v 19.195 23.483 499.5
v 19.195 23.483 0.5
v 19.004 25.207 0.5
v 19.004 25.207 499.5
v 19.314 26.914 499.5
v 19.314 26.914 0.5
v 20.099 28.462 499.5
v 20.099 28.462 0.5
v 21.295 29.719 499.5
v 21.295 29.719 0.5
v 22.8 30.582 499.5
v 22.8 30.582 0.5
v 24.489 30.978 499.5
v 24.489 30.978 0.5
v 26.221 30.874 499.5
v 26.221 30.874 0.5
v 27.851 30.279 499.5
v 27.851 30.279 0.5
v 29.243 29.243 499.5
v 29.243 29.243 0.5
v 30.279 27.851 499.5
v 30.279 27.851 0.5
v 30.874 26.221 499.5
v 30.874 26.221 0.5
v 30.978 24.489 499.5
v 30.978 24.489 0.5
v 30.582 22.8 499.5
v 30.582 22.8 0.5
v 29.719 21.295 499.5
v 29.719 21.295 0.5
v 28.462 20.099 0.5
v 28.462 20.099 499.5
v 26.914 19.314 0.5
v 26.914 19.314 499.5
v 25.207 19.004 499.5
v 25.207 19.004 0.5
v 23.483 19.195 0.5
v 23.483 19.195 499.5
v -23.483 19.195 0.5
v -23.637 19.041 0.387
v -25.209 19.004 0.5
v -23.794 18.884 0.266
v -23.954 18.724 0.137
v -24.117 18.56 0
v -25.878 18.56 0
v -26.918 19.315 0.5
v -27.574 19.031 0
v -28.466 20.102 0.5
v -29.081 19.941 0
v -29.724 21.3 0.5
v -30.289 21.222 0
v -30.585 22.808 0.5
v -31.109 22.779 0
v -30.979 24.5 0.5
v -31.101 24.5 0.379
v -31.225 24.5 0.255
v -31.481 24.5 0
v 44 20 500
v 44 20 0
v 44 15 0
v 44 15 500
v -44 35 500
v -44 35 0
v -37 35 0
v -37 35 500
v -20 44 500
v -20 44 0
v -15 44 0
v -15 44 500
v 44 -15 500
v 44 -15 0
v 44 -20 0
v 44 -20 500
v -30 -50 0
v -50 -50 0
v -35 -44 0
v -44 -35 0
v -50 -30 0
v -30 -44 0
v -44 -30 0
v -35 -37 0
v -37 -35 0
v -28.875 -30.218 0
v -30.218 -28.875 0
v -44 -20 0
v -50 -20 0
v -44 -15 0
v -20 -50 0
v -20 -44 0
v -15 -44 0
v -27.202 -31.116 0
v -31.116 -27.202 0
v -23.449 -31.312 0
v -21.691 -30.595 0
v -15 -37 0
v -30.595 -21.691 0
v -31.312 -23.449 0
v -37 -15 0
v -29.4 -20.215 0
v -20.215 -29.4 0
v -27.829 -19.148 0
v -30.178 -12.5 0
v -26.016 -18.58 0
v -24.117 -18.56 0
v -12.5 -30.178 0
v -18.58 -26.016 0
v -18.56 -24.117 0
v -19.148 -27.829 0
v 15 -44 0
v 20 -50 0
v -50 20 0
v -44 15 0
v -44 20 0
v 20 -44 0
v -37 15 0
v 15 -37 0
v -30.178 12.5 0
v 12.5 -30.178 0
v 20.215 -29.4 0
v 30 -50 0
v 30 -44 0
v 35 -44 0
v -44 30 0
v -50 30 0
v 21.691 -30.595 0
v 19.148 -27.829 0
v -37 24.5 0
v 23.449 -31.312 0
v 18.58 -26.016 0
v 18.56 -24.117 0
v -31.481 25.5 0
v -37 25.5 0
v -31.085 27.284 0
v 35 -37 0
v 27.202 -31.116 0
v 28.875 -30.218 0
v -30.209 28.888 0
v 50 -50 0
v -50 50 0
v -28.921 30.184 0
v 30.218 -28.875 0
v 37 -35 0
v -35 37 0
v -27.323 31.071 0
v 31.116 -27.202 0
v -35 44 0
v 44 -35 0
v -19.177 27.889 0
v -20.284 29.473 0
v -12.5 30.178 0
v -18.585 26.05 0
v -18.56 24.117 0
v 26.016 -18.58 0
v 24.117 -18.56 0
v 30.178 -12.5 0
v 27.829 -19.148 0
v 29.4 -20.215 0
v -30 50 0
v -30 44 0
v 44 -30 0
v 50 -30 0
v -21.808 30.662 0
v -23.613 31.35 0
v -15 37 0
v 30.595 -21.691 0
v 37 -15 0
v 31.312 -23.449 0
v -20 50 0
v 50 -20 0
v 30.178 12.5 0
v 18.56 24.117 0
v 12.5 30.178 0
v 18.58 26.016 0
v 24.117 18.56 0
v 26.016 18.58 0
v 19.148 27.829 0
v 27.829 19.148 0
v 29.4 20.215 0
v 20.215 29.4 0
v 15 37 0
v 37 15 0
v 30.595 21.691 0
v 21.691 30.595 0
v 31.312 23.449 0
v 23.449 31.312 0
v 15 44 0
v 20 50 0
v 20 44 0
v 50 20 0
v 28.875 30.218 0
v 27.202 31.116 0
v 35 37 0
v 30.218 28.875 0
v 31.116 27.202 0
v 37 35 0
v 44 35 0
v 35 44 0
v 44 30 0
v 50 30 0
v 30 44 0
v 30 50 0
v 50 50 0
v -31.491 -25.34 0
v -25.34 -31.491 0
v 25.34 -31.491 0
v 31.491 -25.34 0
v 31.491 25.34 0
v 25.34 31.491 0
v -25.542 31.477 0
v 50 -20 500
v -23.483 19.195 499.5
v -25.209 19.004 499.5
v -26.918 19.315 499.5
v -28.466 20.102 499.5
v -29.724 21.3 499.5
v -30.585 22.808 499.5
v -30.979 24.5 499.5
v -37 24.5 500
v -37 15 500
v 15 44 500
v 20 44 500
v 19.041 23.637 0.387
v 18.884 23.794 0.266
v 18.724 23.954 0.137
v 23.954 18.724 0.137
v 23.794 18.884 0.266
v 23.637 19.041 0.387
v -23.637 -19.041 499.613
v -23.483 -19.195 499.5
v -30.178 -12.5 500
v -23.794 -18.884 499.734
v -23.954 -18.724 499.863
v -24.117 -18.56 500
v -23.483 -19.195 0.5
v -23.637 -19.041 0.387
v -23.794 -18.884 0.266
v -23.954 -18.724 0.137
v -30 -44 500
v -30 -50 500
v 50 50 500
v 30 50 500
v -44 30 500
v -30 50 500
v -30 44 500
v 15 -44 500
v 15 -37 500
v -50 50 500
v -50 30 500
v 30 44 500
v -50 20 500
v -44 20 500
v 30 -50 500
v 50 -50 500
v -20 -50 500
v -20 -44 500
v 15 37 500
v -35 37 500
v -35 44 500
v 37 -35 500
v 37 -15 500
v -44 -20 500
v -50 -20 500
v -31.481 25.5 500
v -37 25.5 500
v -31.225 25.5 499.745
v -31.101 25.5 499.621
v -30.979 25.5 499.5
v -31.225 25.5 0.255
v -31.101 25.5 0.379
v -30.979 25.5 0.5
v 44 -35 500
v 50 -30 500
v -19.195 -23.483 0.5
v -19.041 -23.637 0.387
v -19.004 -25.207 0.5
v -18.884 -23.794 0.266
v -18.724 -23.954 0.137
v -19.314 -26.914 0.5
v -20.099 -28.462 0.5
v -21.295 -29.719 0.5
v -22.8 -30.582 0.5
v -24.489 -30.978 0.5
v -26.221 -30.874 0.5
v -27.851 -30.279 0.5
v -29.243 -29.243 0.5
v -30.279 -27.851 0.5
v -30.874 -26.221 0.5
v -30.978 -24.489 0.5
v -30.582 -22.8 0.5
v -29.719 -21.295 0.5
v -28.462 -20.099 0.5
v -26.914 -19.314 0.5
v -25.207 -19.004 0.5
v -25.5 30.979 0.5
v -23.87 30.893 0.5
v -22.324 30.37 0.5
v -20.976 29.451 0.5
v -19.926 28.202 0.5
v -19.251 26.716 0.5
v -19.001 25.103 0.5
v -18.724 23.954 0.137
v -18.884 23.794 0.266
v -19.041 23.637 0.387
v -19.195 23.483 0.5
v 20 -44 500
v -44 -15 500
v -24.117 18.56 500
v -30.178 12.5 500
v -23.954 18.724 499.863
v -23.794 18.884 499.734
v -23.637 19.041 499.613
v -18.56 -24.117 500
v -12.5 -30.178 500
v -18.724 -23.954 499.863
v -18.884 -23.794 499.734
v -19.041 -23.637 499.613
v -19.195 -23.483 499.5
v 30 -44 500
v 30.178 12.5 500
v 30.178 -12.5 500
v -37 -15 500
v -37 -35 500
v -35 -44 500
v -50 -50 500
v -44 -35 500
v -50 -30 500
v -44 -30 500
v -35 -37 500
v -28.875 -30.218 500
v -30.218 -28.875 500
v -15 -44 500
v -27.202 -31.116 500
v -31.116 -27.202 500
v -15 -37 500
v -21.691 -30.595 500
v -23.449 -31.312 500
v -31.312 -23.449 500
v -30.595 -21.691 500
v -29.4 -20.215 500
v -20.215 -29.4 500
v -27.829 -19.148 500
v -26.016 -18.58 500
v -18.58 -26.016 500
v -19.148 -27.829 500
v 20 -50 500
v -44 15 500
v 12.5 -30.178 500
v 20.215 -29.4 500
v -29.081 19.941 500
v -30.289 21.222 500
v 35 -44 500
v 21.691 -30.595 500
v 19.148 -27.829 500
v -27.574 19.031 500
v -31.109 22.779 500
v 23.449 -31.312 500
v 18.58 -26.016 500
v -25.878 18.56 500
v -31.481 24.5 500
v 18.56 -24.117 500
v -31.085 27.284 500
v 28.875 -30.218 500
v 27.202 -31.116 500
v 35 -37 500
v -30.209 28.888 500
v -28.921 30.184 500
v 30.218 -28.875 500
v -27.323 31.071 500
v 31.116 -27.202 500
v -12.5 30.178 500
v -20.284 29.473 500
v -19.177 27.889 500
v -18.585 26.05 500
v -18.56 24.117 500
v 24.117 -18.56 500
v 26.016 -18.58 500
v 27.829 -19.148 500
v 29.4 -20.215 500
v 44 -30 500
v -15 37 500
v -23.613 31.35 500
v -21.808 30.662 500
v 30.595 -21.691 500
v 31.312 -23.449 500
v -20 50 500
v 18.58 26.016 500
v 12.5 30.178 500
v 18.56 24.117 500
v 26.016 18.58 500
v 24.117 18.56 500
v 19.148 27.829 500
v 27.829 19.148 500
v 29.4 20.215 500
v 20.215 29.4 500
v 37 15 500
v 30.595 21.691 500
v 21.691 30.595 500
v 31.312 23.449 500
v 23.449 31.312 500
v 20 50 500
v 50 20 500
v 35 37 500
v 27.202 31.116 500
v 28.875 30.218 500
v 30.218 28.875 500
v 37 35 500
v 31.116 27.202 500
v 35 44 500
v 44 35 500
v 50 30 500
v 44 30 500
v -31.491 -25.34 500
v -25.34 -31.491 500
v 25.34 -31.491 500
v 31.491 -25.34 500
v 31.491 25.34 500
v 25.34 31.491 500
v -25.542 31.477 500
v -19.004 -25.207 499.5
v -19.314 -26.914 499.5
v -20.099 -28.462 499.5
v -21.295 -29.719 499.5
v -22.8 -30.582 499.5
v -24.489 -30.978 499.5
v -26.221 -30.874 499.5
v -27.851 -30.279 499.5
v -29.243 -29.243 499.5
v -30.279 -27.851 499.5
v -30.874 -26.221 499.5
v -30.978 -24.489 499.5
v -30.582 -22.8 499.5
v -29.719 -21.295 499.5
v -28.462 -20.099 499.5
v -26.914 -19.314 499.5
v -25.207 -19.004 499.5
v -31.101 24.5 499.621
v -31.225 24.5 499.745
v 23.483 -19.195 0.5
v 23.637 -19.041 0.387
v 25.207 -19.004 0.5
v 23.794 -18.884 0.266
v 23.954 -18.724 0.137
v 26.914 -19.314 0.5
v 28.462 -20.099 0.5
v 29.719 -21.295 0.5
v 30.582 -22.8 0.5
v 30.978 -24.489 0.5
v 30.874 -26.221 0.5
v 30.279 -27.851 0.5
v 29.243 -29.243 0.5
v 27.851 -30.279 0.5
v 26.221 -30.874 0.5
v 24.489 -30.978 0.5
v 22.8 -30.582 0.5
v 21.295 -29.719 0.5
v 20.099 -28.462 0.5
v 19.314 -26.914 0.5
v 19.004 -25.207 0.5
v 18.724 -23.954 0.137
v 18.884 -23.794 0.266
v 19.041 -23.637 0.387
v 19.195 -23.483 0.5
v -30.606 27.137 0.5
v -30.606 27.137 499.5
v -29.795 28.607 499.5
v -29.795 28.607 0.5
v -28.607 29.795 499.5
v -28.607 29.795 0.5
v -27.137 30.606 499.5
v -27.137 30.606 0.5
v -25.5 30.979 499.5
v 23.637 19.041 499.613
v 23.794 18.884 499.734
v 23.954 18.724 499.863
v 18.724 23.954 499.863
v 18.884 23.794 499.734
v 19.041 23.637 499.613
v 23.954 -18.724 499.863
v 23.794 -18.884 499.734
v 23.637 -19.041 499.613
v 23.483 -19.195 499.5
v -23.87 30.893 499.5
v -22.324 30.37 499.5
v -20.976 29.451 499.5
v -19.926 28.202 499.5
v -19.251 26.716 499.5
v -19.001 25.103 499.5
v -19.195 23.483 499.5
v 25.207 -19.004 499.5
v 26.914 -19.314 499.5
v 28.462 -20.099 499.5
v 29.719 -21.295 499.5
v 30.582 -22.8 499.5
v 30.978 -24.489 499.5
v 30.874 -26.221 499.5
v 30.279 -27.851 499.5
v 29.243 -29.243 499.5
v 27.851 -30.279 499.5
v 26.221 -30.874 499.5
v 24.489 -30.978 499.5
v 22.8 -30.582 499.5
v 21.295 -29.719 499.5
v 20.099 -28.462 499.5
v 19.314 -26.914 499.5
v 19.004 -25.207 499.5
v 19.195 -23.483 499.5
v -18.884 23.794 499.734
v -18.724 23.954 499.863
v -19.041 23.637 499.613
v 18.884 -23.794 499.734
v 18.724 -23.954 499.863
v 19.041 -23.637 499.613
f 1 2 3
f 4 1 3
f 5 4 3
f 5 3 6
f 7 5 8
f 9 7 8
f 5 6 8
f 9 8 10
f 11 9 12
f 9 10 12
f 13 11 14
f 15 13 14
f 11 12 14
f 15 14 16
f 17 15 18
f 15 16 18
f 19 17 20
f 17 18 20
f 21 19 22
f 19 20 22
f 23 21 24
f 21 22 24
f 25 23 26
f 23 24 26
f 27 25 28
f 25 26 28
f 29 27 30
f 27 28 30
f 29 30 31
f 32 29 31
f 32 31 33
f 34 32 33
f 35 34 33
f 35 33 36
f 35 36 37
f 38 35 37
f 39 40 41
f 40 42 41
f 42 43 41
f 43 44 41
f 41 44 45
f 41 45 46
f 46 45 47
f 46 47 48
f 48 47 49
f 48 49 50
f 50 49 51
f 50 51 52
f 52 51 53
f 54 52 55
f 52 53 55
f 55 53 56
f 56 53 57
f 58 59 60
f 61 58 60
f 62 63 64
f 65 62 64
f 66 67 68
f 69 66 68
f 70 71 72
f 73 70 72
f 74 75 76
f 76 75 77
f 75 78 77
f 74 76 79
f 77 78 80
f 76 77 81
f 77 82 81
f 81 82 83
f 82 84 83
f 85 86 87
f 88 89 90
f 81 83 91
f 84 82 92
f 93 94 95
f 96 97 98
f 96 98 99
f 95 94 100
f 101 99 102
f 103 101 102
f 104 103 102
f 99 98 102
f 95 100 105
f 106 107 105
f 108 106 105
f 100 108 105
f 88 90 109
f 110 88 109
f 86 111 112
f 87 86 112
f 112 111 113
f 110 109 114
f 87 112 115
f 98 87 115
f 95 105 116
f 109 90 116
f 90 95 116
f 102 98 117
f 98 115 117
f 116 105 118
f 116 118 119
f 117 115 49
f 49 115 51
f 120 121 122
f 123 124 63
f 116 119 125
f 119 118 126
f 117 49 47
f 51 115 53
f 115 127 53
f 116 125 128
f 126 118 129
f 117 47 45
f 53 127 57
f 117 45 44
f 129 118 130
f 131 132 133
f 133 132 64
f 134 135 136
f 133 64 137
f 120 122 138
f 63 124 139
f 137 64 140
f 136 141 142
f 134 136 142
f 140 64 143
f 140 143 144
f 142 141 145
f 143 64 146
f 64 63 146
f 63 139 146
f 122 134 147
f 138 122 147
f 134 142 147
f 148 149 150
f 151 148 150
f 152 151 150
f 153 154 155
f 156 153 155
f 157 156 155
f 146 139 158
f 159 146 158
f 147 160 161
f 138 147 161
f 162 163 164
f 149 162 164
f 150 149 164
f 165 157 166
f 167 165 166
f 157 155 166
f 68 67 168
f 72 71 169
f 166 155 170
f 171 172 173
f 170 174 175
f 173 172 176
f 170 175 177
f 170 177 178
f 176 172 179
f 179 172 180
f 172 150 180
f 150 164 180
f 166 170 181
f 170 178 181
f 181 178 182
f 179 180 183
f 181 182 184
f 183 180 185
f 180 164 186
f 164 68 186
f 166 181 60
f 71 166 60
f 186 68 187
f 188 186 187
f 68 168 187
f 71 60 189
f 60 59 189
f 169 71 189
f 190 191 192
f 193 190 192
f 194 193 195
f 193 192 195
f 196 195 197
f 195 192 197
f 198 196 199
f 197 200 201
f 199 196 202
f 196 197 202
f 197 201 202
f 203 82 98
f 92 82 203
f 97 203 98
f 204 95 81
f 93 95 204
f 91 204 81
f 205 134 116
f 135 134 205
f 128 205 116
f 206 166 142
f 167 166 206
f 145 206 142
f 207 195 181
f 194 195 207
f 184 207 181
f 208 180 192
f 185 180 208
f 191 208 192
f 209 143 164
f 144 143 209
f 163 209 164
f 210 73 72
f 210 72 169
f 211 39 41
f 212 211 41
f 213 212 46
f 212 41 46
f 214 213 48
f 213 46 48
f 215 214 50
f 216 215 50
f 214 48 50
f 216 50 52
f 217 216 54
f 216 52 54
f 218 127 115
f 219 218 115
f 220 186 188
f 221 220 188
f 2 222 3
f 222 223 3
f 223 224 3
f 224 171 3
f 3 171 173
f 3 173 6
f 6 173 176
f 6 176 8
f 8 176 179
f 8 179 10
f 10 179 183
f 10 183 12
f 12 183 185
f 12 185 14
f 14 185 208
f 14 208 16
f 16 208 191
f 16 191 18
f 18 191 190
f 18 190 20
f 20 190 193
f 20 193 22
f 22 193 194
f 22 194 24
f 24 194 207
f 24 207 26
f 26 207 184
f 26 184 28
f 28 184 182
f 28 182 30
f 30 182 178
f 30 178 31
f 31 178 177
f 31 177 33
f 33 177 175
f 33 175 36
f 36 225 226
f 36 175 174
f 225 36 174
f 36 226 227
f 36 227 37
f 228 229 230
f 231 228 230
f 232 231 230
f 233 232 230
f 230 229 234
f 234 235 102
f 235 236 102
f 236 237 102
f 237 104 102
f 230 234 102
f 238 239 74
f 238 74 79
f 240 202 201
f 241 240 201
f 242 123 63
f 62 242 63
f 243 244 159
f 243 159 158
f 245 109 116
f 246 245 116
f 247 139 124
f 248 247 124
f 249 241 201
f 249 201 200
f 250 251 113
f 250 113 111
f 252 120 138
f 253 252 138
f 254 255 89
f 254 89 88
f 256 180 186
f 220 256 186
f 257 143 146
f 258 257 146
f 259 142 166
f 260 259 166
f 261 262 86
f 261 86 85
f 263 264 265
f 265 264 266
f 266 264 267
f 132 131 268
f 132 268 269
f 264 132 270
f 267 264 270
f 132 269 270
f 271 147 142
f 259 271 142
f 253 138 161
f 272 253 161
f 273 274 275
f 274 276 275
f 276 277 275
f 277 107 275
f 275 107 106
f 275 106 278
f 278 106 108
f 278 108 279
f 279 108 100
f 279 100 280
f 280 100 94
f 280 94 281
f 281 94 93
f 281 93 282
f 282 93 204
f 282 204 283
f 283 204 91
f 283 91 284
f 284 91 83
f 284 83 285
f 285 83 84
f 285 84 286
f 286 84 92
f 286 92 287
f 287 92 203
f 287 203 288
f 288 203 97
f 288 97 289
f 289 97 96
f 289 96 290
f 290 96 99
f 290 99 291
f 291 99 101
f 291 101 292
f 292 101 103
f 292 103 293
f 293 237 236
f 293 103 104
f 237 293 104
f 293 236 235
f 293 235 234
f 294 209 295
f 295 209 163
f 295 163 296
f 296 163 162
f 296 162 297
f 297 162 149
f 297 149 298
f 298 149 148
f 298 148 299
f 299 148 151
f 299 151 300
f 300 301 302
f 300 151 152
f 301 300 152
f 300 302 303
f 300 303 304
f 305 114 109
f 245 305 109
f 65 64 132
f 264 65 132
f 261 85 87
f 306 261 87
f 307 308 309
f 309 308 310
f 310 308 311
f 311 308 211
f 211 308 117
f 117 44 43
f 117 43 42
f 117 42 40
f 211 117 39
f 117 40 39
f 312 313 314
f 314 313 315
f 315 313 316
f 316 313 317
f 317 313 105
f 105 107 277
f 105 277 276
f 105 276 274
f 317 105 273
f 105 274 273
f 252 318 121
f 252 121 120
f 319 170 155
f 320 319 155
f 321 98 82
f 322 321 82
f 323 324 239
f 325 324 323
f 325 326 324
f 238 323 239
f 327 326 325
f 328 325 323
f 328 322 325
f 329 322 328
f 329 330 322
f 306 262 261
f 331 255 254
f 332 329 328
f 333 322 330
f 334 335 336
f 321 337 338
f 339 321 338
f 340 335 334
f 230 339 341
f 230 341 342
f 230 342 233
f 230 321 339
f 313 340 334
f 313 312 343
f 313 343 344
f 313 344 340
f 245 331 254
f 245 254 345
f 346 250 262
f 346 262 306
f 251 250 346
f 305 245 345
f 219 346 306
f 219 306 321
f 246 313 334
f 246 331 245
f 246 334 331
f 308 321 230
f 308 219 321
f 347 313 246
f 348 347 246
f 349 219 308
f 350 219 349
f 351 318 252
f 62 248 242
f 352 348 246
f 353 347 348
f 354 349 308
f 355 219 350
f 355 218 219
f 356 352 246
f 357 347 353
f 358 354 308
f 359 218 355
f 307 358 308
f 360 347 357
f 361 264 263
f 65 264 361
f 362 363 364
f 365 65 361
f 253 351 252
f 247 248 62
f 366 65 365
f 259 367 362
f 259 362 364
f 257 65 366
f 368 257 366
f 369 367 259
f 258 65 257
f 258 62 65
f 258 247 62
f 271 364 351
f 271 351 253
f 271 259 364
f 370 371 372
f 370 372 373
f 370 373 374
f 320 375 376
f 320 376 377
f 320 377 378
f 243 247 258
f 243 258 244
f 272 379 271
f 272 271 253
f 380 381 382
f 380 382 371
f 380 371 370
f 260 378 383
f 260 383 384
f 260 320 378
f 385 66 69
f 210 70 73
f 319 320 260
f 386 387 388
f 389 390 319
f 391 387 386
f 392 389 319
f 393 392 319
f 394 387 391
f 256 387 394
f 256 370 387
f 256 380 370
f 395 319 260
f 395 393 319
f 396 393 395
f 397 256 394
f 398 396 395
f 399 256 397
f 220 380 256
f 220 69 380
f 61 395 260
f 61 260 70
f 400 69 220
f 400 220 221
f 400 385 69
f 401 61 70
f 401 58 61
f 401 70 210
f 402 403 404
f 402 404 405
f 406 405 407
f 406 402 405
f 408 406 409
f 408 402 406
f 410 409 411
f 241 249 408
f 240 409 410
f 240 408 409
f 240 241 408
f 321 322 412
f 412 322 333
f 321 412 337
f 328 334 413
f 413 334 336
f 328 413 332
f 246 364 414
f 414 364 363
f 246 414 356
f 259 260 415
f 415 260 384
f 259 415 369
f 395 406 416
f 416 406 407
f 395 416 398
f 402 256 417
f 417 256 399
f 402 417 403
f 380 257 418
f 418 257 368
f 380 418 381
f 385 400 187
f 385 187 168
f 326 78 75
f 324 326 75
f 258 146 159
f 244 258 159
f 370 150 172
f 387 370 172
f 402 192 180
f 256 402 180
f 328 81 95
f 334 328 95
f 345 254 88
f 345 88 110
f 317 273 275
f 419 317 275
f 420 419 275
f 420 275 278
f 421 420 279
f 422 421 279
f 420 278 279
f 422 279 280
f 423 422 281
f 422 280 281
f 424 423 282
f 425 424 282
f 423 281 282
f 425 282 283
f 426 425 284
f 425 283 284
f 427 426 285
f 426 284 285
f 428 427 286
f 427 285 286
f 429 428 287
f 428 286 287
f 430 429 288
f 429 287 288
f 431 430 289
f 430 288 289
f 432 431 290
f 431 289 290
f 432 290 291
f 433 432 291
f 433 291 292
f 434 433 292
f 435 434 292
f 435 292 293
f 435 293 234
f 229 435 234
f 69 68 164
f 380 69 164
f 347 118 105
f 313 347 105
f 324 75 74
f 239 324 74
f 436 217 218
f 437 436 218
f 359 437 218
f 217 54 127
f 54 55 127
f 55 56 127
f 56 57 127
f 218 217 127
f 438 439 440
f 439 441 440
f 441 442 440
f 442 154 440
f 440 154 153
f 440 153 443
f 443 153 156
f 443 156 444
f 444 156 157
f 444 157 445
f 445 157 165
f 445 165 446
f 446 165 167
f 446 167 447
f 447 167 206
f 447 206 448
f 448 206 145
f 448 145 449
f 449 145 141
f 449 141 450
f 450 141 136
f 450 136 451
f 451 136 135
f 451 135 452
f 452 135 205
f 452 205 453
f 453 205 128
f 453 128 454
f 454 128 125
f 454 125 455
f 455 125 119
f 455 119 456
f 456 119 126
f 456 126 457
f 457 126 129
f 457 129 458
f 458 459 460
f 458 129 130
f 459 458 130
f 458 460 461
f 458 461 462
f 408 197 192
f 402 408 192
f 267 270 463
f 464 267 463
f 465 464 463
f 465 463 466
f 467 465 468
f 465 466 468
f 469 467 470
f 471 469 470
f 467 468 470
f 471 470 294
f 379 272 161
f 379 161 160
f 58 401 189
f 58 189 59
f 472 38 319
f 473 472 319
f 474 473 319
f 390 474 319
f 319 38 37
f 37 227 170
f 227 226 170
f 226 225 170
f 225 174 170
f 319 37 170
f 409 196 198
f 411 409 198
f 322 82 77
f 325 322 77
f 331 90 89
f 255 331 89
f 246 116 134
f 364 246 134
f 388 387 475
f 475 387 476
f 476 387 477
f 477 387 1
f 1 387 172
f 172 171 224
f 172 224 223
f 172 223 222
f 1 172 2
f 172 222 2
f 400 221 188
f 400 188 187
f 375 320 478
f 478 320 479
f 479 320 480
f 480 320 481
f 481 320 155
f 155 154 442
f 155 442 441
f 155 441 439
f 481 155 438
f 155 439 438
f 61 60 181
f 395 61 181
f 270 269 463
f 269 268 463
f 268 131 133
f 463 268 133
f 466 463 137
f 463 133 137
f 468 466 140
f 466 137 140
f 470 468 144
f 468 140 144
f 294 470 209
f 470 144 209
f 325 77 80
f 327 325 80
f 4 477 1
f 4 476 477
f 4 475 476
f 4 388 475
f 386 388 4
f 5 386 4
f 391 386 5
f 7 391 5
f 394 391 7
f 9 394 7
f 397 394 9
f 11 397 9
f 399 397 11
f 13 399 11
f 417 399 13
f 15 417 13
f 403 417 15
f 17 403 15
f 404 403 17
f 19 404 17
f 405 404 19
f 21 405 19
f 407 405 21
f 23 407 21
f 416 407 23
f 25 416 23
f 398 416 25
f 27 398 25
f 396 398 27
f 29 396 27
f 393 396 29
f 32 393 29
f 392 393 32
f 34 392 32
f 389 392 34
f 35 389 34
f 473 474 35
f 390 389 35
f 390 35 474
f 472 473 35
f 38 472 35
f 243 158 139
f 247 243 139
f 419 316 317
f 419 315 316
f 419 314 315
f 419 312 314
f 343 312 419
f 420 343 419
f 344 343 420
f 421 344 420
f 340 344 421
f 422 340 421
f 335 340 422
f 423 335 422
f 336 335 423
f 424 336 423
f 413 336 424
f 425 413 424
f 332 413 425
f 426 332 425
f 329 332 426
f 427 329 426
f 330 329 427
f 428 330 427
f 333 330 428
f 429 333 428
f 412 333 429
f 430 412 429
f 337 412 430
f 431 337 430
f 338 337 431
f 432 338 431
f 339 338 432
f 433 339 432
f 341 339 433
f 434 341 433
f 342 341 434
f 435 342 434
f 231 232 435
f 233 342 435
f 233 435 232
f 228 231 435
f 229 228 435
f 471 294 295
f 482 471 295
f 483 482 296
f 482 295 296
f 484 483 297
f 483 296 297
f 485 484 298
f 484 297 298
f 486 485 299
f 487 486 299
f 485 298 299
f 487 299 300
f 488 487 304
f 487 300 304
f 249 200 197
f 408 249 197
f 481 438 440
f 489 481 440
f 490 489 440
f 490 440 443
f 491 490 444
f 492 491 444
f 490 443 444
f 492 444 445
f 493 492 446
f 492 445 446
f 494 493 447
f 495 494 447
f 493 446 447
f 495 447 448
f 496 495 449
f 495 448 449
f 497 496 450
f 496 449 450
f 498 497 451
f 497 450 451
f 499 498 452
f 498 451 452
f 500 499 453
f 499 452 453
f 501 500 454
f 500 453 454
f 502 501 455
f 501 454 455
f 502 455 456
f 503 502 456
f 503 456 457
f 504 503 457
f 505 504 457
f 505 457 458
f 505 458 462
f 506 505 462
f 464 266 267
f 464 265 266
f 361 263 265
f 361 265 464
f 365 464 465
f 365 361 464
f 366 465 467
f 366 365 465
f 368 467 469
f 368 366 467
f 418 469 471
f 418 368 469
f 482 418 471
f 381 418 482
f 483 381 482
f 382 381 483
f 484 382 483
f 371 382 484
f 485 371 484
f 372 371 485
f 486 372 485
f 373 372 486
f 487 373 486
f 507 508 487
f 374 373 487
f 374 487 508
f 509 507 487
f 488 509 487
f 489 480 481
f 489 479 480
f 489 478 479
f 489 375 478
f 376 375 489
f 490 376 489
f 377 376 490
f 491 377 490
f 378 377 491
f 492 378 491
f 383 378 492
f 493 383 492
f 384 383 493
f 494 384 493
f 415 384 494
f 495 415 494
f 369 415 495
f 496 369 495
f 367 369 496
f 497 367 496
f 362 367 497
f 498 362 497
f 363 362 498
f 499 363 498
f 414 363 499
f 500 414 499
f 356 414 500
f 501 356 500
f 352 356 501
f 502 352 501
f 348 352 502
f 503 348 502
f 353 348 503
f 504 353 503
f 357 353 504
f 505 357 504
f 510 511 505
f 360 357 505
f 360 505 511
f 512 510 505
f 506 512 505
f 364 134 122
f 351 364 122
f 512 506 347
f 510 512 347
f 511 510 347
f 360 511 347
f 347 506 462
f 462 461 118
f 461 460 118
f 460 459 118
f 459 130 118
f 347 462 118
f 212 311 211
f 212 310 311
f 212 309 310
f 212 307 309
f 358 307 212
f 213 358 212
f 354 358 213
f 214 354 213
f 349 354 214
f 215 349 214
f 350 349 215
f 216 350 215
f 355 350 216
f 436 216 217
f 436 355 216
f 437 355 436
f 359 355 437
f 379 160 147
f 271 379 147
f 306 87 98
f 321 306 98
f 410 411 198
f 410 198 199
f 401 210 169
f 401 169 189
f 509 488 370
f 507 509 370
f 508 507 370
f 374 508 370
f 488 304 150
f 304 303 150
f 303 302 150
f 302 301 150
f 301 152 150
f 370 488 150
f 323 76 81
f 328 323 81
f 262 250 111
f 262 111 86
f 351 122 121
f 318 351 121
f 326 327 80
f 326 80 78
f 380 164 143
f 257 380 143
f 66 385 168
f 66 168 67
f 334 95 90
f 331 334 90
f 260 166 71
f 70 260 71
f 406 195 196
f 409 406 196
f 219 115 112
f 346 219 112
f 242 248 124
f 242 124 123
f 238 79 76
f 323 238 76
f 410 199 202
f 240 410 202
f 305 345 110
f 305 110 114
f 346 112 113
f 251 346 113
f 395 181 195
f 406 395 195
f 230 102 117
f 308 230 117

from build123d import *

# Parameters (mm, degrees)
F1_DEPTH = 500
F2_SIZE  = 0.5


with BuildPart() as f1:
    # F0 (on Top) → F1 (new body)
    with BuildSketch(Plane.XY):
        with BuildLine():
            Line((-30, 50), (-50, 50))
            Line((-50, 50), (-50, 30))
            Line((-50, 30), (-44, 30))
            Line((-44, 30), (-44, 35))
            Line((-44, 35), (-37, 35))
            Line((-37, 35), (-37, 25.5))
            Line((-37, 25.5), (-30.97913, 25.5))
            ThreePointArc((-30.97913, 25.5), (-29.242641, 29.242641), (-25.5, 30.97913))
            ThreePointArc((-25.5, 30.97913), (-20.408156, 28.861991), (-19.195037, 23.482633))
            Line((-19.195037, 23.482633), (-12.5, 30.17767))
            Line((-12.5, 30.17767), (12.5, 30.17767))
            Line((12.5, 30.17767), (19.195037, 23.482633))
            ThreePointArc((19.195037, 23.482633), (29.242641, 29.242641), (23.482633, 19.195037))
            Line((23.482633, 19.195037), (30.17767, 12.5))
            Line((30.17767, 12.5), (30.17767, -12.5))
            Line((30.17767, -12.5), (23.482633, -19.195037))
            ThreePointArc((23.482633, -19.195037), (29.242641, -29.242641), (19.195037, -23.482633))
            Line((19.195037, -23.482633), (12.5, -30.17767))
            Line((12.5, -30.17767), (-12.5, -30.17767))
            Line((-12.5, -30.17767), (-19.195037, -23.482633))
            ThreePointArc((-19.195037, -23.482633), (-29.242641, -29.242641), (-23.482633, -19.195037))
            Line((-23.482633, -19.195037), (-30.17767, -12.5))
            Line((-30.17767, -12.5), (-30.17767, 12.5))
            Line((-30.17767, 12.5), (-23.482633, 19.195037))
            ThreePointArc((-23.482633, 19.195037), (-28.465904, 20.102295), (-30.97913, 24.5))
            Line((-30.97913, 24.5), (-37, 24.5))
            Line((-37, 24.5), (-37, 15))
            Line((-37, 15), (-44, 15))
            Line((-44, 15), (-44, 20))
            Line((-44, 20), (-50, 20))
            Line((-50, 20), (-50, -20))
            Line((-50, -20), (-44, -20))
            Line((-44, -20), (-44, -15))
            Line((-44, -15), (-37, -15))
            Line((-37, -15), (-37, -35))
            Line((-37, -35), (-44, -35))
            Line((-44, -35), (-44, -30))
            Line((-44, -30), (-50, -30))
            Line((-50, -30), (-50, -50))
            Line((-50, -50), (-30, -50))
            Line((-30, -50), (-30, -44))
            Line((-30, -44), (-35, -44))
            Line((-35, -44), (-35, -37))
            Line((-35, -37), (-15, -37))
            Line((-15, -37), (-15, -44))
            Line((-15, -44), (-20, -44))
            Line((-20, -44), (-20, -50))
            Line((-20, -50), (20, -50))
            Line((20, -50), (20, -44))
            Line((20, -44), (15, -44))
            Line((15, -44), (15, -37))
            Line((15, -37), (35, -37))
            Line((35, -37), (35, -44))
            Line((35, -44), (30, -44))
            Line((30, -44), (30, -50))
            Line((30, -50), (50, -50))
            Line((50, -50), (50, -30))
            Line((50, -30), (44, -30))
            Line((44, -30), (44, -35))
            Line((44, -35), (37, -35))
            Line((37, -35), (37, -15))
            Line((37, -15), (44, -15))
            Line((44, -15), (44, -20))
            Line((44, -20), (50, -20))
            Line((50, -20), (50, 20))
            Line((50, 20), (44, 20))
            Line((44, 20), (44, 15))
            Line((44, 15), (37, 15))
            Line((37, 15), (37, 35))
            Line((37, 35), (44, 35))
            Line((44, 35), (44, 30))
            Line((44, 30), (50, 30))
            Line((50, 30), (50, 50))
            Line((50, 50), (30, 50))
            Line((30, 50), (30, 44))
            Line((30, 44), (35, 44))
            Line((35, 44), (35, 37))
            Line((35, 37), (15, 37))
            Line((15, 37), (15, 44))
            Line((15, 44), (20, 44))
            Line((20, 44), (20, 50))
            Line((20, 50), (-20, 50))
            Line((-20, 50), (-20, 44))
            Line((-20, 44), (-15, 44))
            Line((-15, 44), (-15, 37))
            Line((-15, 37), (-25.5, 37))
            Line((-25.5, 37), (-35, 37))
            Line((-35, 37), (-35, 44))
            Line((-35, 44), (-30, 44))
            Line((-30, 44), (-30, 50))
        make_face()
    extrude(amount=F1_DEPTH)

    # F2
    f2_edges = [f1.edges().sort_by_distance(p)[0] for p in [
        (-23.987564, 30.913964, 500),
        (-28.465904, 20.102295, 500),
        (-29.242641, -29.242641, 500),
        (29.242641, -29.242641, 500),
        (29.242641, 29.242641, 500),
        (29.242641, 29.242641, 0),
        (29.242641, -29.242641, 0),
        (-29.242641, -29.242641, 0),
        (-28.465904, 20.102295, 0),
        (-23.987564, 30.913964, 0),
    ]]
    chamfer(f2_edges, length=F2_SIZE)


solid = f1.part
